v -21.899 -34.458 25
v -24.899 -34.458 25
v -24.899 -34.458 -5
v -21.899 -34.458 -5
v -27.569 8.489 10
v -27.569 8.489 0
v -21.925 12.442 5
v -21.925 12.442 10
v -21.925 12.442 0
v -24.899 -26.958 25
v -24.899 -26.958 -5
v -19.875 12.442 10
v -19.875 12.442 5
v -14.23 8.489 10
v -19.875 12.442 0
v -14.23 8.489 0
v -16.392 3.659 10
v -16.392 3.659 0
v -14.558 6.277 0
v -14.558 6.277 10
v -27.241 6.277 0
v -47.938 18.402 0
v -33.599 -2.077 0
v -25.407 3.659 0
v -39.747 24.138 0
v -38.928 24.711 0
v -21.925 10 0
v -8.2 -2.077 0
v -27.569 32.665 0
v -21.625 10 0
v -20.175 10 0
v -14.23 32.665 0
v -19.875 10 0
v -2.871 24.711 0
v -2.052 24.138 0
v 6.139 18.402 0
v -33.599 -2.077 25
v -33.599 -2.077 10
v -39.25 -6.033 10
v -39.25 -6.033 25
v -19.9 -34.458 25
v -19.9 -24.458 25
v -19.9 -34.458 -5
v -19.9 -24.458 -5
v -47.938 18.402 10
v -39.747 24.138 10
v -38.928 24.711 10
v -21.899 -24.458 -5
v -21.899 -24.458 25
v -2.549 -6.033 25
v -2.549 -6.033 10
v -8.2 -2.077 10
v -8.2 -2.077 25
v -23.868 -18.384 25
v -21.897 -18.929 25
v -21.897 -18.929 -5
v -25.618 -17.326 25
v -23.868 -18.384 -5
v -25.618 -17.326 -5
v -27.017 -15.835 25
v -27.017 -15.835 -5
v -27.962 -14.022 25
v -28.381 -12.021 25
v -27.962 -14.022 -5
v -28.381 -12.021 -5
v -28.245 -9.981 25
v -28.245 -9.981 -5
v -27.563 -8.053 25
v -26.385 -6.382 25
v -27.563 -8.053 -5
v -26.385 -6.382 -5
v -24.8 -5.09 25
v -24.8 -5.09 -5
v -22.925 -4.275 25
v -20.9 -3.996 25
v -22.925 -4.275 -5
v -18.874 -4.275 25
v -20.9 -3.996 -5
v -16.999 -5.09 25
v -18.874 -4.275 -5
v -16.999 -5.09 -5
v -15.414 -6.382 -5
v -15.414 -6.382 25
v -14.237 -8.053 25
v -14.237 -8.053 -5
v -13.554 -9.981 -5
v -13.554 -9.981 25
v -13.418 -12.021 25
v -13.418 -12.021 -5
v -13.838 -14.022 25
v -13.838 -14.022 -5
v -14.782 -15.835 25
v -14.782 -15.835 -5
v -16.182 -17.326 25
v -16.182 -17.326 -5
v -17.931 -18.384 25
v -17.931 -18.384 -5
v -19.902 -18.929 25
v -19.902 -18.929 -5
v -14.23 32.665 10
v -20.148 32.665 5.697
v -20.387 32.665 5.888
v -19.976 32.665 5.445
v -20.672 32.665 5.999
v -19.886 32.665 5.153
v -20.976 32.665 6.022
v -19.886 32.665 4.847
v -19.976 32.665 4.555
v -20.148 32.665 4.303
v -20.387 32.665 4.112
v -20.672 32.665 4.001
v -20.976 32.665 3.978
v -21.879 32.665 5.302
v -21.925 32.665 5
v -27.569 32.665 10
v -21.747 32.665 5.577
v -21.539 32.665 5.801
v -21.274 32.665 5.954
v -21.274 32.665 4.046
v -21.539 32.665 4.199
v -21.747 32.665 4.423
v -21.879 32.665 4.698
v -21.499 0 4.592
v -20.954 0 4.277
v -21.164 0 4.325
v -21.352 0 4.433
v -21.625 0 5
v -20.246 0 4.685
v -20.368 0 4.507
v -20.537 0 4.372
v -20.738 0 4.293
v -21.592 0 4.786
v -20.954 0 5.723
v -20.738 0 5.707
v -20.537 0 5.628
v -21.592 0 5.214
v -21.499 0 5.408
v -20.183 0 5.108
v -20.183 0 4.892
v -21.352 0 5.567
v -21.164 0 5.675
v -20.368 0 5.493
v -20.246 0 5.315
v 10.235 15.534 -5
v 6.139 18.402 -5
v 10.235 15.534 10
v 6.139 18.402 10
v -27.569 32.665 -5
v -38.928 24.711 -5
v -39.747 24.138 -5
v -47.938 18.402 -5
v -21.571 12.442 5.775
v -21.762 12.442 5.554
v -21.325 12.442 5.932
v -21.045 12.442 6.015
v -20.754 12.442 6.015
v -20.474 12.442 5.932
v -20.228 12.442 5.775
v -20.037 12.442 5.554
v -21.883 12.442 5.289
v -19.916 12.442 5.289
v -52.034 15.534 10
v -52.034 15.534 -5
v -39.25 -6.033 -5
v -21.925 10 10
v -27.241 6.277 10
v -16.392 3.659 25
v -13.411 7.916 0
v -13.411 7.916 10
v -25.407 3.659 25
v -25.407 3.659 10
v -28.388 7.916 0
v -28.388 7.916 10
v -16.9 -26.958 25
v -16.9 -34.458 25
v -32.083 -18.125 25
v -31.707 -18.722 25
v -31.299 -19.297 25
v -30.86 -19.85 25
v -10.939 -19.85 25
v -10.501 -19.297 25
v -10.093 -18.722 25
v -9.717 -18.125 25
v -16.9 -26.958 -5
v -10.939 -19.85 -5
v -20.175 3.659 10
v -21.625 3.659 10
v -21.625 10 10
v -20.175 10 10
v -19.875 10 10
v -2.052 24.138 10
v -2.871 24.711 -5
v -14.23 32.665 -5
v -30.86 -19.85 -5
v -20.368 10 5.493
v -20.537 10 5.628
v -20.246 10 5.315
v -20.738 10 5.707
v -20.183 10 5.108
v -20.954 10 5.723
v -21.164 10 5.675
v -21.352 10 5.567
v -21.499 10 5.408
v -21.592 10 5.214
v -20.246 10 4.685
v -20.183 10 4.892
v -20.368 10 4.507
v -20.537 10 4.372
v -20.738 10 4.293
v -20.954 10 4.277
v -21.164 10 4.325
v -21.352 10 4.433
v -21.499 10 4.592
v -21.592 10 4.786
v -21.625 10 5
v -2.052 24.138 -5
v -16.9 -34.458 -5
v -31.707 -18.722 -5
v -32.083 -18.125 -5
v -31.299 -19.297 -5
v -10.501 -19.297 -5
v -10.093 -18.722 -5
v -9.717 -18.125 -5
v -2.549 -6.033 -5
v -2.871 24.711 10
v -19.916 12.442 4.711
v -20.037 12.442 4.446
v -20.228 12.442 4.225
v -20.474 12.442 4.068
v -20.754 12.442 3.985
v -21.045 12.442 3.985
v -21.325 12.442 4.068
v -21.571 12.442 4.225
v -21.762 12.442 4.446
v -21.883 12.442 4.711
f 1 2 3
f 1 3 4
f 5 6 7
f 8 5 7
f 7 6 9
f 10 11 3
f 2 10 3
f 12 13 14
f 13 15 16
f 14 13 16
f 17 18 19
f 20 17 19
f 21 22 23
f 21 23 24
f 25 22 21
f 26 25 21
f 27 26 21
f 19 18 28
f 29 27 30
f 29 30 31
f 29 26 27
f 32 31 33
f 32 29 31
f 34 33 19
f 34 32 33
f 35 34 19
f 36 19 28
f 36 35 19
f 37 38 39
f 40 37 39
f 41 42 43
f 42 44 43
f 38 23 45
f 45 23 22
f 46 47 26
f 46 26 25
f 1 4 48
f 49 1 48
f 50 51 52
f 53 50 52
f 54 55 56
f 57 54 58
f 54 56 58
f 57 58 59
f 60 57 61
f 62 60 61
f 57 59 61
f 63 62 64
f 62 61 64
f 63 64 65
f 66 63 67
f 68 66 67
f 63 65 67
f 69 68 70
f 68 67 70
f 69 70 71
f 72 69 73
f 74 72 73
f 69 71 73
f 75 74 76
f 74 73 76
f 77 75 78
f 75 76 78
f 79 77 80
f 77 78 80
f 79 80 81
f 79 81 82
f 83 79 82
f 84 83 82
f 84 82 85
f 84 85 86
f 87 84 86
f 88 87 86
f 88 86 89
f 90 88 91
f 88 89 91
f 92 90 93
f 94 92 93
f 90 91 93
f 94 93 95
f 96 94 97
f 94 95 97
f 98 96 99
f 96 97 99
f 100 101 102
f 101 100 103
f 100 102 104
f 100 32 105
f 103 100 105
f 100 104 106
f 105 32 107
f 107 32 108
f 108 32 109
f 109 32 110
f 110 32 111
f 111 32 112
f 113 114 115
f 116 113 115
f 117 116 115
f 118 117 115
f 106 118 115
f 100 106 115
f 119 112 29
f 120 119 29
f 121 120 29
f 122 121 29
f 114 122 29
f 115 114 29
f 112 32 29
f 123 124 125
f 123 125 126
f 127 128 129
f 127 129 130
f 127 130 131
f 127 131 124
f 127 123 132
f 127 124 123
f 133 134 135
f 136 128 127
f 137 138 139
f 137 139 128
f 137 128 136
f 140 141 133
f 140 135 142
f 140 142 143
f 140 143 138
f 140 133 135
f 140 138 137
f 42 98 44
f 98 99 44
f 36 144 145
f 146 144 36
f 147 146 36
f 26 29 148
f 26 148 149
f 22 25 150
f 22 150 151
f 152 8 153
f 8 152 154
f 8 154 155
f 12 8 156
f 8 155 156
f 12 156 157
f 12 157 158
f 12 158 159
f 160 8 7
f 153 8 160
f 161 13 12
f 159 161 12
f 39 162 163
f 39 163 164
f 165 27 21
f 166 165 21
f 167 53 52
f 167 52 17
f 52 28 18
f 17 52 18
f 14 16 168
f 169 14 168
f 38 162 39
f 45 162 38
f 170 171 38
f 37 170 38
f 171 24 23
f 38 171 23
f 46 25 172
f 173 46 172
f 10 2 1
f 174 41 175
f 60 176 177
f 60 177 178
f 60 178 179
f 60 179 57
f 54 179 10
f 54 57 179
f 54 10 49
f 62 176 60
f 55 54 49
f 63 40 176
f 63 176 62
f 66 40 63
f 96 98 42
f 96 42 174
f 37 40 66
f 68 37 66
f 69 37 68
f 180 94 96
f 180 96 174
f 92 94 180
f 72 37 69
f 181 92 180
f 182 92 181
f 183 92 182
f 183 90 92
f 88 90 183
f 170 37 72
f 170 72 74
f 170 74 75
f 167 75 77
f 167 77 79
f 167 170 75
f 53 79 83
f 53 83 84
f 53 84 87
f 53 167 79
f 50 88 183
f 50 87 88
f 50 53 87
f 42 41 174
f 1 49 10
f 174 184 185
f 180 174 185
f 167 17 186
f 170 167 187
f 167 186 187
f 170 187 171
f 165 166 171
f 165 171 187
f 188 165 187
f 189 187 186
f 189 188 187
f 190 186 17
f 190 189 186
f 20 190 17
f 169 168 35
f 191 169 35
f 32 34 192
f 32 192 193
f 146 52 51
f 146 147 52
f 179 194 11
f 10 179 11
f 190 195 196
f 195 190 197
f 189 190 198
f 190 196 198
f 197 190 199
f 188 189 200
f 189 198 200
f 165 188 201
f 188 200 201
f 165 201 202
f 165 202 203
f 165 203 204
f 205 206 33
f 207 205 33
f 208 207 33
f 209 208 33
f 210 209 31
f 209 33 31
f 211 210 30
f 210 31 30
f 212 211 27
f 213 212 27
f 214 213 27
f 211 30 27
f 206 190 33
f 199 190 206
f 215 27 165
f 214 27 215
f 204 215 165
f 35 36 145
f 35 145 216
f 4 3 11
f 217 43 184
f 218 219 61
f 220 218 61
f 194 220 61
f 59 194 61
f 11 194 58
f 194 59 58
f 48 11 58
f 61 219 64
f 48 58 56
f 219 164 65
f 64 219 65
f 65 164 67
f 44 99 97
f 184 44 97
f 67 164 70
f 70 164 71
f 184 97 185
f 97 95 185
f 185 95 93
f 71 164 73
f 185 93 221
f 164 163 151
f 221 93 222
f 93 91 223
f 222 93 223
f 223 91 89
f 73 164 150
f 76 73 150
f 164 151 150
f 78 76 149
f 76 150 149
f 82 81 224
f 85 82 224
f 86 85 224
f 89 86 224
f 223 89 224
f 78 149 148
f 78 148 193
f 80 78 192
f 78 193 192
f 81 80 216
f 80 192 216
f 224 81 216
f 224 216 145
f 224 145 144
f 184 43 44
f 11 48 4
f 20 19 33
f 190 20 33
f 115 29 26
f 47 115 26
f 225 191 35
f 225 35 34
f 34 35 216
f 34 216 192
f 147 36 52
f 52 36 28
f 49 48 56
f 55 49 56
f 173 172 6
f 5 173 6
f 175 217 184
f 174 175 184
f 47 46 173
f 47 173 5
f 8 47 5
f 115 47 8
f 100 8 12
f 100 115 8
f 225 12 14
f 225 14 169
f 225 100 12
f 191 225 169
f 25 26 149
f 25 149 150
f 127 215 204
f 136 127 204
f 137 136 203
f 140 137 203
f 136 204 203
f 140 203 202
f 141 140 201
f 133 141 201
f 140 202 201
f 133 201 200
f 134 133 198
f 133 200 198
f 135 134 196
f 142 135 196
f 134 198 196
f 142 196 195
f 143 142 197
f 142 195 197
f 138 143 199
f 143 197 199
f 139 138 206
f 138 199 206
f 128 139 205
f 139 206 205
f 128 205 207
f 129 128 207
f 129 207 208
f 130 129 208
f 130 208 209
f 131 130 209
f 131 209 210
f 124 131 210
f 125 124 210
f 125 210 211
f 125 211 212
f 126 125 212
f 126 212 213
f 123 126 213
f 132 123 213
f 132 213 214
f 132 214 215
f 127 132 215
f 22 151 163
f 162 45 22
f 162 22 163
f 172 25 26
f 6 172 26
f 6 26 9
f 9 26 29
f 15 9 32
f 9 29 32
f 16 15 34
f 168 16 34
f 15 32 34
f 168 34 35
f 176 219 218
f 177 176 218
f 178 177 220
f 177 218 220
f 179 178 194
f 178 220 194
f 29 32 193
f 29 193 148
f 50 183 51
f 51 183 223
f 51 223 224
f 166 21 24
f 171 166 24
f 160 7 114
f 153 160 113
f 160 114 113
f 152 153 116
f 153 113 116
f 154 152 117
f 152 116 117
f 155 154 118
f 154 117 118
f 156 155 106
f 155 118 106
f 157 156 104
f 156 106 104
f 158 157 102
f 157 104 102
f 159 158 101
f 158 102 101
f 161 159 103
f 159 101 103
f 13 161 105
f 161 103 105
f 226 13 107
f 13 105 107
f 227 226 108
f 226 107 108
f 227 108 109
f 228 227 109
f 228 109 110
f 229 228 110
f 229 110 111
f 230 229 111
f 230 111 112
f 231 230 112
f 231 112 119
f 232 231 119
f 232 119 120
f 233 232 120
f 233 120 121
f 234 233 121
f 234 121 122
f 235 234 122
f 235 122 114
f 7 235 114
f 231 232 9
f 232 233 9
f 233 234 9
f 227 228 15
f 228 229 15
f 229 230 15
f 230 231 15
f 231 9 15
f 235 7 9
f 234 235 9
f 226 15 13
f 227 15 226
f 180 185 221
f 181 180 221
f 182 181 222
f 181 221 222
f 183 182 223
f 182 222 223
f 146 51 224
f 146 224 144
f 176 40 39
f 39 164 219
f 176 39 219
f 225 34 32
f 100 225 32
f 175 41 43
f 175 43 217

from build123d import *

# Parameters (mm, degrees)
F1_W     = 1.45
F1_H     = 6.3409252325
F2_DEPTH = 5
F3_DEPTH = 10
F5_DEPTH = 25
F6_DEPTH = 10
F4_R     = 0.725
F7_DEPTH = 32.664992266
F4_R_2   = 1.025
F8_DEPTH = 20.2234430885


# Not quite as in the source:
# - a feature names something its author has since deleted; it is built from what else it names


with BuildPart() as f2:
    # F1 (on Top) → F2 (new body)
    with BuildSketch(Plane.XY):
        with BuildLine():
            ThreePointArc((-21.8973851311, -18.9294214119), (-28.3829246015, -10.9960880786), (-20.899609828, -3.9960880786))
            ThreePointArc((-20.899609828, -3.9960880786), (-13.4162950544, -10.9960880786), (-19.9018345249, -18.9294214119))
            Line((-19.9018345249, -18.9294214119), (-19.9003497467, -24.4576265402))
            ThreePointArc((-19.9003497467, -24.4576265402), (-18.3828834375, -24.250149717), (-16.9003497467, -23.8656442066))
            ThreePointArc((-16.9003497467, -23.8656442066), (-13.6367119074, -22.2780319569), (-10.9391436703, -19.8500759839))
            ThreePointArc((-10.9391436703, -19.8500759839), (-10.2927451499, -19.0123651957), (-9.7166149372, -18.12486061))
            ThreePointArc((-9.7166149372, -18.12486061), (-9.4290474991, -5.3783924455), (-20.174609828, 1.4836798315))
            Line((-20.174609828, 1.4836798315), (-20.174609828, 0))
            Line((-20.174609828, 0), (-20.899609828, 0))
            Line((-20.899609828, 0), (-21.624609828, 0))
            Line((-21.624609828, 0), (-21.624609828, 1.4836798315))
            ThreePointArc((-21.624609828, 1.4836798315), (-32.3701721569, -5.3783924455), (-32.0826047188, -18.12486061))
            ThreePointArc((-32.0826047188, -18.12486061), (-31.5064745061, -19.0123651957), (-30.8600759857, -19.8500759839))
            ThreePointArc((-30.8600759857, -19.8500759839), (-28.1625077486, -22.2780319569), (-24.8988699093, -23.8656442066))
            ThreePointArc((-24.8988699093, -23.8656442066), (-23.4163362185, -24.250149717), (-21.8988699093, -24.4576265402))
            Line((-21.8988699093, -24.4576265402), (-21.8973851311, -18.9294214119))
        make_face()
        with BuildLine():
            Line((-21.8988699093, -34.4576265402), (-21.8988699093, -24.4576265402))
            ThreePointArc((-21.8988699093, -24.4576265402), (-23.4163362185, -24.250149717), (-24.8988699093, -23.8656442066))
            Line((-24.8988699093, -23.8656442066), (-24.8988699093, -26.9576265402))
            Line((-24.8988699093, -26.9576265402), (-24.8988699093, -34.4576265402))
            Line((-24.8988699093, -34.4576265402), (-21.8988699093, -34.4576265402))
        make_face()
        with BuildLine():
            ThreePointArc((-16.9003497467, -23.8656442066), (-18.3828834375, -24.250149717), (-19.9003497467, -24.4576265402))
            Line((-19.9003497467, -24.4576265402), (-19.9003497467, -34.4576265402))
            Line((-19.9003497467, -34.4576265402), (-16.9003497467, -34.4576265402))
            Line((-16.9003497467, -34.4576265402), (-16.9003497467, -26.9576265402))
            Line((-16.9003497467, -26.9576265402), (-16.9003497467, -23.8656442066))
        make_face()
        with BuildLine():
            Line((-24.8988699093, -26.9576265402), (-24.8988699093, -23.8656442066))
            ThreePointArc((-24.8988699093, -23.8656442066), (-28.1625077486, -22.2780319569), (-30.8600759857, -19.8500759839))
            Line((-30.8600759857, -19.8500759839), (-24.8988699093, -26.9576265402))
        make_face()
        with BuildLine():
            ThreePointArc((-10.9391436703, -19.8500759839), (-13.6367119074, -22.2780319569), (-16.9003497467, -23.8656442066))
            Line((-16.9003497467, -23.8656442066), (-16.9003497467, -26.9576265402))
            Line((-16.9003497467, -26.9576265402), (-10.9391436703, -19.8500759839))
        make_face()
        with BuildLine():
            Line((-39.2498481908, -6.0334444768), (-32.0826047188, -18.12486061))
            ThreePointArc((-32.0826047188, -18.12486061), (-32.3701721569, -5.3783924455), (-21.624609828, 1.4836798315))
            Line((-21.624609828, 1.4836798315), (-21.624609828, 3.6590747675))
            Line((-21.624609828, 3.6590747675), (-25.4074961518, 3.6590747675))
            Line((-25.4074961518, 3.6590747675), (-33.5990165947, -2.076689596))
            Line((-33.5990165947, -2.076689596), (-39.2498481908, -6.0334444768))
        make_face()
        with BuildLine():
            ThreePointArc((-20.174609828, 1.4836798315), (-9.4290474991, -5.3783924455), (-9.7166149372, -18.12486061))
            Line((-9.7166149372, -18.12486061), (-2.5493714652, -6.0334444768))
            Line((-2.5493714652, -6.0334444768), (-8.2002030613, -2.076689596))
            Line((-8.2002030613, -2.076689596), (-16.3917235042, 3.6590747675))
            Line((-16.3917235042, 3.6590747675), (-20.174609828, 3.6590747675))
            Line((-20.174609828, 3.6590747675), (-20.174609828, 1.4836798315))
        make_face()
        with BuildLine():
            Line((-21.624609828, 3.6590747675), (-21.624609828, 1.4836798315))
            ThreePointArc((-21.624609828, 1.4836798315), (-21.2622509514, 1.4988529145), (-20.899609828, 1.5039119214))
            ThreePointArc((-20.899609828, 1.5039119214), (-20.5369687046, 1.4988529145), (-20.174609828, 1.4836798315))
            Line((-20.174609828, 1.4836798315), (-20.174609828, 3.6590747675))
            Line((-20.174609828, 3.6590747675), (-21.624609828, 3.6590747675))
        make_face()
        with BuildLine():
            ThreePointArc((-20.899609828, 1.5039119214), (-21.2622509514, 1.4988529145), (-21.624609828, 1.4836798315))
            Line((-21.624609828, 1.4836798315), (-21.624609828, 0))
            Line((-21.624609828, 0), (-20.899609828, 0))
            Line((-20.899609828, 0), (-20.174609828, 0))
            Line((-20.174609828, 0), (-20.174609828, 1.4836798315))
            ThreePointArc((-20.174609828, 1.4836798315), (-20.5369687046, 1.4988529145), (-20.899609828, 1.5039119214))
        make_face()
        Polygon((-52.0341877249, 15.5342293294), (-39.2498481908, -6.0334444768), (-33.5990165947, -2.076689596), (-47.9384275035, 18.4021115112), align=None)
        Polygon((-8.2002030613, -2.076689596), (-2.5493714652, -6.0334444768), (10.2349680689, 15.5342293294), (6.1392078475, 18.4021115112), align=None)
        Polygon((-25.4074961518, 3.6590747675), (-21.624609828, 3.6590747675), (-21.624609828, 10), (-21.924609828, 10), (-27.2409219547, 6.2774781734), align=None)
        with Locations((-20.899609828, 6.8295373837)):
            Rectangle(F1_W, F1_H)
        Polygon((-47.9384275035, 18.4021115112), (-33.5990165947, -2.076689596), (-25.4074961518, 3.6590747675), (-27.2409219547, 6.2774781734), (-28.3880748274, 7.915782262), (-39.7469070606, 24.1378758747), align=None)
        Polygon((-16.3917235042, 3.6590747675), (-8.2002030613, -2.076689596), (6.1392078475, 18.4021115112), (-2.0523125954, 24.1378758747), (-13.4111448286, 7.915782262), (-14.5582977013, 6.2774781734), align=None)
        Polygon((-20.174609828, 10), (-20.174609828, 3.6590747675), (-16.3917235042, 3.6590747675), (-14.5582977013, 6.2774781734), (-19.874609828, 10), align=None)
        Polygon((-21.924609828, 10), (-21.624609828, 10), (-20.174609828, 10), (-19.874609828, 10), (-19.874609828, 12.4415491775), (-21.924609828, 12.4415491775), align=None)
        Polygon((-27.2409219547, 6.2774781734), (-21.924609828, 10), (-21.924609828, 12.4415491775), (-27.5689227831, 8.4893586983), (-28.3880748274, 7.915782262), align=None)
        Polygon((-38.9277550163, 24.7114523111), (-39.7469070606, 24.1378758747), (-28.3880748274, 7.915782262), (-27.5689227831, 8.4893586983), (-27.5689227831, 32.664992266), align=None)
        Polygon((-13.4111448286, 7.915782262), (-2.0523125954, 24.1378758747), (-2.8714646397, 24.7114523111), (-14.2302968729, 32.664992266), (-14.2302968729, 8.4893586983), align=None)
        Polygon((-19.874609828, 10), (-14.5582977013, 6.2774781734), (-13.4111448286, 7.915782262), (-14.2302968729, 8.4893586983), (-19.874609828, 12.4415491775), align=None)
        Polygon((-27.5689227831, 8.4893586983), (-21.924609828, 12.4415491775), (-21.924609828, 32.664992266), (-27.5689227831, 32.664992266), align=None)
        Polygon((-21.924609828, 32.664992266), (-21.924609828, 12.4415491775), (-19.874609828, 12.4415491775), (-19.874609828, 32.664992266), (-20.899609828, 32.664992266), align=None)
        Polygon((-19.874609828, 32.664992266), (-19.874609828, 12.4415491775), (-14.2302968729, 8.4893586983), (-14.2302968729, 32.664992266), align=None)
    extrude(amount=-F2_DEPTH)

    # F1 (on Top) → F5 (join)
    with BuildSketch(Plane.XY):
        with BuildLine():
            ThreePointArc((-21.8973851311, -18.9294214119), (-28.3829246015, -10.9960880786), (-20.899609828, -3.9960880786))
            ThreePointArc((-20.899609828, -3.9960880786), (-13.4162950544, -10.9960880786), (-19.9018345249, -18.9294214119))
            Line((-19.9018345249, -18.9294214119), (-19.9003497467, -24.4576265402))
            ThreePointArc((-19.9003497467, -24.4576265402), (-18.3828834375, -24.250149717), (-16.9003497467, -23.8656442066))
            ThreePointArc((-16.9003497467, -23.8656442066), (-13.6367119074, -22.2780319569), (-10.9391436703, -19.8500759839))
            ThreePointArc((-10.9391436703, -19.8500759839), (-10.2927451499, -19.0123651957), (-9.7166149372, -18.12486061))
            ThreePointArc((-9.7166149372, -18.12486061), (-9.4290474991, -5.3783924455), (-20.174609828, 1.4836798315))
            Line((-20.174609828, 1.4836798315), (-20.174609828, 0))
            Line((-20.174609828, 0), (-20.899609828, 0))
            Line((-20.899609828, 0), (-21.624609828, 0))
            Line((-21.624609828, 0), (-21.624609828, 1.4836798315))
            ThreePointArc((-21.624609828, 1.4836798315), (-32.3701721569, -5.3783924455), (-32.0826047188, -18.12486061))
            ThreePointArc((-32.0826047188, -18.12486061), (-31.5064745061, -19.0123651957), (-30.8600759857, -19.8500759839))
            ThreePointArc((-30.8600759857, -19.8500759839), (-28.1625077486, -22.2780319569), (-24.8988699093, -23.8656442066))
            ThreePointArc((-24.8988699093, -23.8656442066), (-23.4163362185, -24.250149717), (-21.8988699093, -24.4576265402))
            Line((-21.8988699093, -24.4576265402), (-21.8973851311, -18.9294214119))
        make_face()
        with BuildLine():
            Line((-21.8988699093, -34.4576265402), (-21.8988699093, -24.4576265402))
            ThreePointArc((-21.8988699093, -24.4576265402), (-23.4163362185, -24.250149717), (-24.8988699093, -23.8656442066))
            Line((-24.8988699093, -23.8656442066), (-24.8988699093, -26.9576265402))
            Line((-24.8988699093, -26.9576265402), (-24.8988699093, -34.4576265402))
            Line((-24.8988699093, -34.4576265402), (-21.8988699093, -34.4576265402))
        make_face()
        with BuildLine():
            ThreePointArc((-16.9003497467, -23.8656442066), (-18.3828834375, -24.250149717), (-19.9003497467, -24.4576265402))
            Line((-19.9003497467, -24.4576265402), (-19.9003497467, -34.4576265402))
            Line((-19.9003497467, -34.4576265402), (-16.9003497467, -34.4576265402))
            Line((-16.9003497467, -34.4576265402), (-16.9003497467, -26.9576265402))
            Line((-16.9003497467, -26.9576265402), (-16.9003497467, -23.8656442066))
        make_face()
        with BuildLine():
            Line((-24.8988699093, -26.9576265402), (-24.8988699093, -23.8656442066))
            ThreePointArc((-24.8988699093, -23.8656442066), (-28.1625077486, -22.2780319569), (-30.8600759857, -19.8500759839))
            Line((-30.8600759857, -19.8500759839), (-24.8988699093, -26.9576265402))
        make_face()
        with BuildLine():
            ThreePointArc((-10.9391436703, -19.8500759839), (-13.6367119074, -22.2780319569), (-16.9003497467, -23.8656442066))
            Line((-16.9003497467, -23.8656442066), (-16.9003497467, -26.9576265402))
            Line((-16.9003497467, -26.9576265402), (-10.9391436703, -19.8500759839))
        make_face()
        with BuildLine():
            Line((-39.2498481908, -6.0334444768), (-32.0826047188, -18.12486061))
            ThreePointArc((-32.0826047188, -18.12486061), (-32.3701721569, -5.3783924455), (-21.624609828, 1.4836798315))
            Line((-21.624609828, 1.4836798315), (-21.624609828, 3.6590747675))
            Line((-21.624609828, 3.6590747675), (-25.4074961518, 3.6590747675))
            Line((-25.4074961518, 3.6590747675), (-33.5990165947, -2.076689596))
            Line((-33.5990165947, -2.076689596), (-39.2498481908, -6.0334444768))
        make_face()
        with BuildLine():
            ThreePointArc((-20.174609828, 1.4836798315), (-9.4290474991, -5.3783924455), (-9.7166149372, -18.12486061))
            Line((-9.7166149372, -18.12486061), (-2.5493714652, -6.0334444768))
            Line((-2.5493714652, -6.0334444768), (-8.2002030613, -2.076689596))
            Line((-8.2002030613, -2.076689596), (-16.3917235042, 3.6590747675))
            Line((-16.3917235042, 3.6590747675), (-20.174609828, 3.6590747675))
            Line((-20.174609828, 3.6590747675), (-20.174609828, 1.4836798315))
        make_face()
        with BuildLine():
            Line((-21.624609828, 3.6590747675), (-21.624609828, 1.4836798315))
            ThreePointArc((-21.624609828, 1.4836798315), (-21.2622509514, 1.4988529145), (-20.899609828, 1.5039119214))
            ThreePointArc((-20.899609828, 1.5039119214), (-20.5369687046, 1.4988529145), (-20.174609828, 1.4836798315))
            Line((-20.174609828, 1.4836798315), (-20.174609828, 3.6590747675))
            Line((-20.174609828, 3.6590747675), (-21.624609828, 3.6590747675))
        make_face()
        with BuildLine():
            ThreePointArc((-20.899609828, 1.5039119214), (-21.2622509514, 1.4988529145), (-21.624609828, 1.4836798315))
            Line((-21.624609828, 1.4836798315), (-21.624609828, 0))
            Line((-21.624609828, 0), (-20.899609828, 0))
            Line((-20.899609828, 0), (-20.174609828, 0))
            Line((-20.174609828, 0), (-20.174609828, 1.4836798315))
            ThreePointArc((-20.174609828, 1.4836798315), (-20.5369687046, 1.4988529145), (-20.899609828, 1.5039119214))
        make_face()
    extrude(amount=F5_DEPTH)

    # F1 (on Top) → F6 (join)
    with BuildSketch(Plane.XY):
        with BuildLine():
            ThreePointArc((-21.8973851311, -18.9294214119), (-28.3829246015, -10.9960880786), (-20.899609828, -3.9960880786))
            ThreePointArc((-20.899609828, -3.9960880786), (-13.4162950544, -10.9960880786), (-19.9018345249, -18.9294214119))
            Line((-19.9018345249, -18.9294214119), (-19.9003497467, -24.4576265402))
            ThreePointArc((-19.9003497467, -24.4576265402), (-18.3828834375, -24.250149717), (-16.9003497467, -23.8656442066))
            ThreePointArc((-16.9003497467, -23.8656442066), (-13.6367119074, -22.2780319569), (-10.9391436703, -19.8500759839))
            ThreePointArc((-10.9391436703, -19.8500759839), (-10.2927451499, -19.0123651957), (-9.7166149372, -18.12486061))
            ThreePointArc((-9.7166149372, -18.12486061), (-9.4290474991, -5.3783924455), (-20.174609828, 1.4836798315))
            Line((-20.174609828, 1.4836798315), (-20.174609828, 0))
            Line((-20.174609828, 0), (-20.899609828, 0))
            Line((-20.899609828, 0), (-21.624609828, 0))
            Line((-21.624609828, 0), (-21.624609828, 1.4836798315))
            ThreePointArc((-21.624609828, 1.4836798315), (-32.3701721569, -5.3783924455), (-32.0826047188, -18.12486061))
            ThreePointArc((-32.0826047188, -18.12486061), (-31.5064745061, -19.0123651957), (-30.8600759857, -19.8500759839))
            ThreePointArc((-30.8600759857, -19.8500759839), (-28.1625077486, -22.2780319569), (-24.8988699093, -23.8656442066))
            ThreePointArc((-24.8988699093, -23.8656442066), (-23.4163362185, -24.250149717), (-21.8988699093, -24.4576265402))
            Line((-21.8988699093, -24.4576265402), (-21.8973851311, -18.9294214119))
        make_face()
        with BuildLine():
            Line((-24.8988699093, -26.9576265402), (-24.8988699093, -23.8656442066))
            ThreePointArc((-24.8988699093, -23.8656442066), (-28.1625077486, -22.2780319569), (-30.8600759857, -19.8500759839))
            Line((-30.8600759857, -19.8500759839), (-24.8988699093, -26.9576265402))
        make_face()
        with BuildLine():
            Line((-21.8988699093, -34.4576265402), (-21.8988699093, -24.4576265402))
            ThreePointArc((-21.8988699093, -24.4576265402), (-23.4163362185, -24.250149717), (-24.8988699093, -23.8656442066))
            Line((-24.8988699093, -23.8656442066), (-24.8988699093, -26.9576265402))
            Line((-24.8988699093, -26.9576265402), (-24.8988699093, -34.4576265402))
            Line((-24.8988699093, -34.4576265402), (-21.8988699093, -34.4576265402))
        make_face()
        with BuildLine():
            ThreePointArc((-16.9003497467, -23.8656442066), (-18.3828834375, -24.250149717), (-19.9003497467, -24.4576265402))
            Line((-19.9003497467, -24.4576265402), (-19.9003497467, -34.4576265402))
            Line((-19.9003497467, -34.4576265402), (-16.9003497467, -34.4576265402))
            Line((-16.9003497467, -34.4576265402), (-16.9003497467, -26.9576265402))
            Line((-16.9003497467, -26.9576265402), (-16.9003497467, -23.8656442066))
        make_face()
        with BuildLine():
            ThreePointArc((-10.9391436703, -19.8500759839), (-13.6367119074, -22.2780319569), (-16.9003497467, -23.8656442066))
            Line((-16.9003497467, -23.8656442066), (-16.9003497467, -26.9576265402))
            Line((-16.9003497467, -26.9576265402), (-10.9391436703, -19.8500759839))
        make_face()
        Polygon((-52.0341877249, 15.5342293294), (-39.2498481908, -6.0334444768), (-33.5990165947, -2.076689596), (-47.9384275035, 18.4021115112), align=None)
        Polygon((-8.2002030613, -2.076689596), (-2.5493714652, -6.0334444768), (10.2349680689, 15.5342293294), (6.1392078475, 18.4021115112), align=None)
        with BuildLine():
            Line((-39.2498481908, -6.0334444768), (-32.0826047188, -18.12486061))
            ThreePointArc((-32.0826047188, -18.12486061), (-32.3701721569, -5.3783924455), (-21.624609828, 1.4836798315))
            Line((-21.624609828, 1.4836798315), (-21.624609828, 3.6590747675))
            Line((-21.624609828, 3.6590747675), (-25.4074961518, 3.6590747675))
            Line((-25.4074961518, 3.6590747675), (-33.5990165947, -2.076689596))
            Line((-33.5990165947, -2.076689596), (-39.2498481908, -6.0334444768))
        make_face()
        with BuildLine():
            ThreePointArc((-20.174609828, 1.4836798315), (-9.4290474991, -5.3783924455), (-9.7166149372, -18.12486061))
            Line((-9.7166149372, -18.12486061), (-2.5493714652, -6.0334444768))
            Line((-2.5493714652, -6.0334444768), (-8.2002030613, -2.076689596))
            Line((-8.2002030613, -2.076689596), (-16.3917235042, 3.6590747675))
            Line((-16.3917235042, 3.6590747675), (-20.174609828, 3.6590747675))
            Line((-20.174609828, 3.6590747675), (-20.174609828, 1.4836798315))
        make_face()
        with BuildLine():
            ThreePointArc((-20.899609828, 1.5039119214), (-21.2622509514, 1.4988529145), (-21.624609828, 1.4836798315))
            Line((-21.624609828, 1.4836798315), (-21.624609828, 0))
            Line((-21.624609828, 0), (-20.899609828, 0))
            Line((-20.899609828, 0), (-20.174609828, 0))
            Line((-20.174609828, 0), (-20.174609828, 1.4836798315))
            ThreePointArc((-20.174609828, 1.4836798315), (-20.5369687046, 1.4988529145), (-20.899609828, 1.5039119214))
        make_face()
        Polygon((-20.174609828, 10), (-20.174609828, 3.6590747675), (-16.3917235042, 3.6590747675), (-14.5582977013, 6.2774781734), (-19.874609828, 10), align=None)
        Polygon((-25.4074961518, 3.6590747675), (-21.624609828, 3.6590747675), (-21.624609828, 10), (-21.924609828, 10), (-27.2409219547, 6.2774781734), align=None)
        with Locations((-20.899609828, 6.8295373837)):
            Rectangle(F1_W, F1_H)
    extrude(amount=F6_DEPTH)


with BuildPart() as f3:
    # F1 (on Top) → F3 (new body)
    with BuildSketch(Plane.XY):
        Polygon((-19.874609828, 32.664992266), (-19.874609828, 12.4415491775), (-14.2302968729, 8.4893586983), (-14.2302968729, 32.664992266), align=None)
        Polygon((-27.5689227831, 8.4893586983), (-21.924609828, 12.4415491775), (-21.924609828, 32.664992266), (-27.5689227831, 32.664992266), align=None)
        Polygon((-38.9277550163, 24.7114523111), (-39.7469070606, 24.1378758747), (-28.3880748274, 7.915782262), (-27.5689227831, 8.4893586983), (-27.5689227831, 32.664992266), align=None)
        Polygon((-13.4111448286, 7.915782262), (-2.0523125954, 24.1378758747), (-2.8714646397, 24.7114523111), (-14.2302968729, 32.664992266), (-14.2302968729, 8.4893586983), align=None)
        Polygon((-21.924609828, 32.664992266), (-21.924609828, 12.4415491775), (-19.874609828, 12.4415491775), (-19.874609828, 32.664992266), (-20.899609828, 32.664992266), align=None)
    extrude(amount=F3_DEPTH)


with BuildPart() as f7_tool:
    # F4 (on face) → F7 (new body, through all)
    with BuildSketch(Plane(origin=(0, 32.664992266, 0), x_dir=(-1, 0, 0), z_dir=(0, 1, 0))):
        with Locations((20.899609828, 5)):
            Circle(F4_R)
    extrude(amount=-F7_DEPTH)


with BuildPart() as f2_1:
    add(f2.part)

    # F7: cut by f7_tool
    add(f7_tool.part, mode=Mode.SUBTRACT)


with BuildPart() as f3_1:
    add(f3.part)

    # F7: cut by f7_tool
    add(f7_tool.part, mode=Mode.SUBTRACT)

    # F4 (on face) → F8 (cut, through all)
    with BuildSketch(Plane(origin=(0, 32.664992266, 0), x_dir=(-1, 0, 0), z_dir=(0, 1, 0))):
        with Locations((20.899609828, 5)):
            Circle(F4_R_2)
        with Locations((20.899609828, 5)):
            Circle(F4_R, mode=Mode.SUBTRACT)
    extrude(amount=-F8_DEPTH, mode=Mode.SUBTRACT)


solid = Compound([f2_1.part, f3_1.part])
